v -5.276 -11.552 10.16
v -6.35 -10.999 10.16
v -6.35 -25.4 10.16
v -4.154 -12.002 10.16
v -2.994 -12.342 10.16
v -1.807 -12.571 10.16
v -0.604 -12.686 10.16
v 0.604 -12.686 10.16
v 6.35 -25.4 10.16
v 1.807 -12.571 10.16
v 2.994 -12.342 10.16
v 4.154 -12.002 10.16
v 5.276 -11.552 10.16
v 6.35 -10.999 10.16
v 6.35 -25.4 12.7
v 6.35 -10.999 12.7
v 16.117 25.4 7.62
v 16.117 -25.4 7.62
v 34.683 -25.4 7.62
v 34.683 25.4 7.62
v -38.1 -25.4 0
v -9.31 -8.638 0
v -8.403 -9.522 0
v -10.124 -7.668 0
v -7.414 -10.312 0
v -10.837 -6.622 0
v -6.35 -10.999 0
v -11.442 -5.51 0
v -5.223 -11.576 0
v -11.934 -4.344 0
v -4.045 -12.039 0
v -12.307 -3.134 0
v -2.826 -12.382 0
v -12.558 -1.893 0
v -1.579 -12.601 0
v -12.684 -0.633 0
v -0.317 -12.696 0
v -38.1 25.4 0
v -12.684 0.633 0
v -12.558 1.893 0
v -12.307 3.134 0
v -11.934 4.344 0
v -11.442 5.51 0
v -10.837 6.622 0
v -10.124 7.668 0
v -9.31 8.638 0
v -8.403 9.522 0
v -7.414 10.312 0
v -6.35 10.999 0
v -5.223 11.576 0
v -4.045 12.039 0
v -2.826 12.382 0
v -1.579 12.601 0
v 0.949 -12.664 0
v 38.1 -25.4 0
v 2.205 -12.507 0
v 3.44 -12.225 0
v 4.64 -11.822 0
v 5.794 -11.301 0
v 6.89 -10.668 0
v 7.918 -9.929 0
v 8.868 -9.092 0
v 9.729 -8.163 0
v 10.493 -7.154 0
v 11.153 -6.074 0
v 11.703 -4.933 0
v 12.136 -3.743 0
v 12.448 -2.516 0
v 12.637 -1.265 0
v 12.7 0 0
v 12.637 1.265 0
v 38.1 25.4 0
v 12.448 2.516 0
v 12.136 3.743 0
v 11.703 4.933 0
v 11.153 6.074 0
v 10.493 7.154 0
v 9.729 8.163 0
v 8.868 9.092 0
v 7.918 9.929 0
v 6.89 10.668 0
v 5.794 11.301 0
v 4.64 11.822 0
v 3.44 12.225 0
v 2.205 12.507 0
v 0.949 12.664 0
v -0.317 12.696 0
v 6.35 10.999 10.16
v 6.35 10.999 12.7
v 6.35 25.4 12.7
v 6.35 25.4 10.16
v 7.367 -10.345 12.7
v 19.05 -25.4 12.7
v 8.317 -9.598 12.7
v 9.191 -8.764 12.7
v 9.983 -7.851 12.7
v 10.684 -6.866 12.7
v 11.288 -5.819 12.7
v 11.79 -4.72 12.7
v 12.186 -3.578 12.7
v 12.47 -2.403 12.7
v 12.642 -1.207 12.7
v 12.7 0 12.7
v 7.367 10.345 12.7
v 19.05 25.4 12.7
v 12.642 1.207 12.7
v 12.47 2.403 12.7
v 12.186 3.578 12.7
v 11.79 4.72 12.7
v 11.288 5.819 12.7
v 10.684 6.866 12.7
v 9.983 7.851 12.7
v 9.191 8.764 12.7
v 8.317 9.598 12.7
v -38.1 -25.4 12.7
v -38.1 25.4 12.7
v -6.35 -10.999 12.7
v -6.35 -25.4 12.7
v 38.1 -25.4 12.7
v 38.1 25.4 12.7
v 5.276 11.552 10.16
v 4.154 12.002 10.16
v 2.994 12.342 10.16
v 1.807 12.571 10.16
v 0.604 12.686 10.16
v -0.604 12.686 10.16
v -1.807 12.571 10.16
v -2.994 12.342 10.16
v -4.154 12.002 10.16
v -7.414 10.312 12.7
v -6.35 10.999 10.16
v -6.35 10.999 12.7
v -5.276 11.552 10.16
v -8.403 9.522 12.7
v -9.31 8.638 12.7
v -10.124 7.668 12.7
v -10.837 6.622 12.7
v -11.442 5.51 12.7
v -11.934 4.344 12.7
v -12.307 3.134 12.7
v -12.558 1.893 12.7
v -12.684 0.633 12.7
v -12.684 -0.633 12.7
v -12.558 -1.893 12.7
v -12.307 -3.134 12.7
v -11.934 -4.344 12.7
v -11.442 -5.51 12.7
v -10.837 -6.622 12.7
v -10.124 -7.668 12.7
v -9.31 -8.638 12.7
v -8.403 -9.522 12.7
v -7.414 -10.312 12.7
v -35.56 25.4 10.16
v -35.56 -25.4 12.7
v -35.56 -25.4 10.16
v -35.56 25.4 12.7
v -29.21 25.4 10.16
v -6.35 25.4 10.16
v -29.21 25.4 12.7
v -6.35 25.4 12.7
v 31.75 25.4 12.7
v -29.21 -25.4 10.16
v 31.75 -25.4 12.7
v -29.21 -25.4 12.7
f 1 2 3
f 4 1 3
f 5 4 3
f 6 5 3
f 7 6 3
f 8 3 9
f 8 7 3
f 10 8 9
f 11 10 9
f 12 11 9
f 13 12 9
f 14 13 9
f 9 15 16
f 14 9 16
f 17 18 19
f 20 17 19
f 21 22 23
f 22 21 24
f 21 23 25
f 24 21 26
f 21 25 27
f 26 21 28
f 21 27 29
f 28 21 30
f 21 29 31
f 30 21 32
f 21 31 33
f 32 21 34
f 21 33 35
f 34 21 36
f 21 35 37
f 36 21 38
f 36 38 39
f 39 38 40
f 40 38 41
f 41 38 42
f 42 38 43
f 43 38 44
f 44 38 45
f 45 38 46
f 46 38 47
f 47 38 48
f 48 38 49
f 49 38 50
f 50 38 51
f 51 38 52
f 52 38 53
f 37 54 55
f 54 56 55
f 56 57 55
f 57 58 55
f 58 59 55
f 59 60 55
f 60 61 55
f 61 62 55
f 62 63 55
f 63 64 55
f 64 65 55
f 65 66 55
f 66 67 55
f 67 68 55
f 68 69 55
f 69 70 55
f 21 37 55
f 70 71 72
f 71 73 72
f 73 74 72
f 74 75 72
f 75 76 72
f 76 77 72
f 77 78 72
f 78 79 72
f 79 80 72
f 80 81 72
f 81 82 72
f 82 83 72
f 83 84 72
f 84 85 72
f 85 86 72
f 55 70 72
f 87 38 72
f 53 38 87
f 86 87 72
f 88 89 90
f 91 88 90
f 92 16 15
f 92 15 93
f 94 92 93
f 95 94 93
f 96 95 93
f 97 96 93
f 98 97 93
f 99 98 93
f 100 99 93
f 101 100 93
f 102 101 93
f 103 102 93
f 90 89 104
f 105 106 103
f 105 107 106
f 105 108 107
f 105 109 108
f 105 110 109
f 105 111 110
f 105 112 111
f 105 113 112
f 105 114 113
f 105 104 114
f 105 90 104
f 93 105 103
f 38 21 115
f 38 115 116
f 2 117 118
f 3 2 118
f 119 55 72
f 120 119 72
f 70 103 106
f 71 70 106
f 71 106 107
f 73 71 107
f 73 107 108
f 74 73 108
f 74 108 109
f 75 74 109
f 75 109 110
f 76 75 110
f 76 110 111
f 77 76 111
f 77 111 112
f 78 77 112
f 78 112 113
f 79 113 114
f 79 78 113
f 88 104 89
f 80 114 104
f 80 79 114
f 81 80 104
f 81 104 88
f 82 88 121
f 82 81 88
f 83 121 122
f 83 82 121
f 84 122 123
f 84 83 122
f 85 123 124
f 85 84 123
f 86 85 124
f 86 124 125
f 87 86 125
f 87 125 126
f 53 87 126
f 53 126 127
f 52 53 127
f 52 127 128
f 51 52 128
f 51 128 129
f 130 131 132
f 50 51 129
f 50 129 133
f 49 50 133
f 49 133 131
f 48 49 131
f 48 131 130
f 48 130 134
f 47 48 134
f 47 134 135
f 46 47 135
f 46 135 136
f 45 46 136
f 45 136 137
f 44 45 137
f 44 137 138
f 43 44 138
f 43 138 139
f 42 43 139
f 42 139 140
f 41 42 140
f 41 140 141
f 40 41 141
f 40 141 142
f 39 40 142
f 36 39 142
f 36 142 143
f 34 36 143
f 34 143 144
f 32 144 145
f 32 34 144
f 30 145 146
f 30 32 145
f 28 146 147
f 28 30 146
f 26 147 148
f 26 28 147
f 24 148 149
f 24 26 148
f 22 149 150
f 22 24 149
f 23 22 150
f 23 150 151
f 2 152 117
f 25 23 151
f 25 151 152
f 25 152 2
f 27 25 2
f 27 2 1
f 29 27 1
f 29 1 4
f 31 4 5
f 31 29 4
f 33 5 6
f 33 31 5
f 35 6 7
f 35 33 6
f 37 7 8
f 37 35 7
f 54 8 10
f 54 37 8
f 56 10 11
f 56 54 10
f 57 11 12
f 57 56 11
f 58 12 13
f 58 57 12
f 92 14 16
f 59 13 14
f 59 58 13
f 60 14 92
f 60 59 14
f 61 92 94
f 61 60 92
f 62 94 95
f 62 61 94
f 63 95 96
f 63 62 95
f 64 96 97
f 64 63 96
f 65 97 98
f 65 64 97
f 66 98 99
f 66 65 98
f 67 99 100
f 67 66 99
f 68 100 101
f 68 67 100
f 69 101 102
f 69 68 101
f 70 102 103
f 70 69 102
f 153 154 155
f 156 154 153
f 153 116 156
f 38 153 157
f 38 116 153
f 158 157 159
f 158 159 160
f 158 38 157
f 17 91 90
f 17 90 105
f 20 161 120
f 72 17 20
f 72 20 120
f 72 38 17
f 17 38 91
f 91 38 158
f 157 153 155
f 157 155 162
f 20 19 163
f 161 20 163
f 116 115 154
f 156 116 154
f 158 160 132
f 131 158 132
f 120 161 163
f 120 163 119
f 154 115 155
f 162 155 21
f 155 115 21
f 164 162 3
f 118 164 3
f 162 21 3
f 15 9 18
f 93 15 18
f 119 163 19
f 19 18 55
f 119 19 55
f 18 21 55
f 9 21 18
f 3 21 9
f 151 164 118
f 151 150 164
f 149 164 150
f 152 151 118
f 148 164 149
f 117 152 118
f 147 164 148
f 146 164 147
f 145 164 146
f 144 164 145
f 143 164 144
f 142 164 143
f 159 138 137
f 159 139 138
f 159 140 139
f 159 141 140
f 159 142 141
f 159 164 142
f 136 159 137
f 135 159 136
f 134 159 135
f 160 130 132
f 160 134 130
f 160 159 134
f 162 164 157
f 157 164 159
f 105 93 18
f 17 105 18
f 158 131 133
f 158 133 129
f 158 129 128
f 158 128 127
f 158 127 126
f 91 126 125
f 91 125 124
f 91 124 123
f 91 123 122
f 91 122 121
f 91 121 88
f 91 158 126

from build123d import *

# Parameters (mm, degrees)
F0_W     = 76.2
F0_H     = 50.8
F0_R     = 12.7
F1_DEPTH = 12.7
F2_W     = 6.35
F2_H     = 50.8
F3_DEPTH = 2.54
F5_DEPTH = 50.801


with BuildPart() as f1:
    # F0 (on Top) → F1 (new body)
    with BuildSketch(Plane.XY):
        Rectangle(F0_W, F0_H)
        Circle(F0_R, mode=Mode.SUBTRACT)
    extrude(amount=F1_DEPTH)

    # F2 (on face) → F3 (cut)
    with BuildSketch(Plane.XY.offset(12.7)):
        with Locations((-32.385, 0)):
            Rectangle(F2_W, F2_H)
        with BuildLine():
            Line((6.35, 25.4), (-6.35, 25.4))
            Line((-6.35, 25.4), (-6.35, 10.9985226281))
            ThreePointArc((-6.35, 10.9985226281), (0, 12.7), (6.35, 10.9985226281))
            Line((6.35, 10.9985226281), (6.35, 25.4))
        make_face()
        with BuildLine():
            Line((-6.35, -10.9985226281), (-6.35, -25.4))
            Line((-6.35, -25.4), (6.35, -25.4))
            Line((6.35, -25.4), (6.35, -10.9985226281))
            ThreePointArc((6.35, -10.9985226281), (0, -12.7), (-6.35, -10.9985226281))
        make_face()
    extrude(amount=-F3_DEPTH, mode=Mode.SUBTRACT)

    # F4 (on face) → F5 (cut, through all)
    with BuildSketch(Plane.XZ.offset(25.4)):
        Polygon((31.75, 12.7), (19.05, 12.7), (16.1170606325, 7.62), (34.6829393675, 7.62), align=None)
    extrude(amount=-F5_DEPTH, mode=Mode.SUBTRACT)


solid = f1.part
